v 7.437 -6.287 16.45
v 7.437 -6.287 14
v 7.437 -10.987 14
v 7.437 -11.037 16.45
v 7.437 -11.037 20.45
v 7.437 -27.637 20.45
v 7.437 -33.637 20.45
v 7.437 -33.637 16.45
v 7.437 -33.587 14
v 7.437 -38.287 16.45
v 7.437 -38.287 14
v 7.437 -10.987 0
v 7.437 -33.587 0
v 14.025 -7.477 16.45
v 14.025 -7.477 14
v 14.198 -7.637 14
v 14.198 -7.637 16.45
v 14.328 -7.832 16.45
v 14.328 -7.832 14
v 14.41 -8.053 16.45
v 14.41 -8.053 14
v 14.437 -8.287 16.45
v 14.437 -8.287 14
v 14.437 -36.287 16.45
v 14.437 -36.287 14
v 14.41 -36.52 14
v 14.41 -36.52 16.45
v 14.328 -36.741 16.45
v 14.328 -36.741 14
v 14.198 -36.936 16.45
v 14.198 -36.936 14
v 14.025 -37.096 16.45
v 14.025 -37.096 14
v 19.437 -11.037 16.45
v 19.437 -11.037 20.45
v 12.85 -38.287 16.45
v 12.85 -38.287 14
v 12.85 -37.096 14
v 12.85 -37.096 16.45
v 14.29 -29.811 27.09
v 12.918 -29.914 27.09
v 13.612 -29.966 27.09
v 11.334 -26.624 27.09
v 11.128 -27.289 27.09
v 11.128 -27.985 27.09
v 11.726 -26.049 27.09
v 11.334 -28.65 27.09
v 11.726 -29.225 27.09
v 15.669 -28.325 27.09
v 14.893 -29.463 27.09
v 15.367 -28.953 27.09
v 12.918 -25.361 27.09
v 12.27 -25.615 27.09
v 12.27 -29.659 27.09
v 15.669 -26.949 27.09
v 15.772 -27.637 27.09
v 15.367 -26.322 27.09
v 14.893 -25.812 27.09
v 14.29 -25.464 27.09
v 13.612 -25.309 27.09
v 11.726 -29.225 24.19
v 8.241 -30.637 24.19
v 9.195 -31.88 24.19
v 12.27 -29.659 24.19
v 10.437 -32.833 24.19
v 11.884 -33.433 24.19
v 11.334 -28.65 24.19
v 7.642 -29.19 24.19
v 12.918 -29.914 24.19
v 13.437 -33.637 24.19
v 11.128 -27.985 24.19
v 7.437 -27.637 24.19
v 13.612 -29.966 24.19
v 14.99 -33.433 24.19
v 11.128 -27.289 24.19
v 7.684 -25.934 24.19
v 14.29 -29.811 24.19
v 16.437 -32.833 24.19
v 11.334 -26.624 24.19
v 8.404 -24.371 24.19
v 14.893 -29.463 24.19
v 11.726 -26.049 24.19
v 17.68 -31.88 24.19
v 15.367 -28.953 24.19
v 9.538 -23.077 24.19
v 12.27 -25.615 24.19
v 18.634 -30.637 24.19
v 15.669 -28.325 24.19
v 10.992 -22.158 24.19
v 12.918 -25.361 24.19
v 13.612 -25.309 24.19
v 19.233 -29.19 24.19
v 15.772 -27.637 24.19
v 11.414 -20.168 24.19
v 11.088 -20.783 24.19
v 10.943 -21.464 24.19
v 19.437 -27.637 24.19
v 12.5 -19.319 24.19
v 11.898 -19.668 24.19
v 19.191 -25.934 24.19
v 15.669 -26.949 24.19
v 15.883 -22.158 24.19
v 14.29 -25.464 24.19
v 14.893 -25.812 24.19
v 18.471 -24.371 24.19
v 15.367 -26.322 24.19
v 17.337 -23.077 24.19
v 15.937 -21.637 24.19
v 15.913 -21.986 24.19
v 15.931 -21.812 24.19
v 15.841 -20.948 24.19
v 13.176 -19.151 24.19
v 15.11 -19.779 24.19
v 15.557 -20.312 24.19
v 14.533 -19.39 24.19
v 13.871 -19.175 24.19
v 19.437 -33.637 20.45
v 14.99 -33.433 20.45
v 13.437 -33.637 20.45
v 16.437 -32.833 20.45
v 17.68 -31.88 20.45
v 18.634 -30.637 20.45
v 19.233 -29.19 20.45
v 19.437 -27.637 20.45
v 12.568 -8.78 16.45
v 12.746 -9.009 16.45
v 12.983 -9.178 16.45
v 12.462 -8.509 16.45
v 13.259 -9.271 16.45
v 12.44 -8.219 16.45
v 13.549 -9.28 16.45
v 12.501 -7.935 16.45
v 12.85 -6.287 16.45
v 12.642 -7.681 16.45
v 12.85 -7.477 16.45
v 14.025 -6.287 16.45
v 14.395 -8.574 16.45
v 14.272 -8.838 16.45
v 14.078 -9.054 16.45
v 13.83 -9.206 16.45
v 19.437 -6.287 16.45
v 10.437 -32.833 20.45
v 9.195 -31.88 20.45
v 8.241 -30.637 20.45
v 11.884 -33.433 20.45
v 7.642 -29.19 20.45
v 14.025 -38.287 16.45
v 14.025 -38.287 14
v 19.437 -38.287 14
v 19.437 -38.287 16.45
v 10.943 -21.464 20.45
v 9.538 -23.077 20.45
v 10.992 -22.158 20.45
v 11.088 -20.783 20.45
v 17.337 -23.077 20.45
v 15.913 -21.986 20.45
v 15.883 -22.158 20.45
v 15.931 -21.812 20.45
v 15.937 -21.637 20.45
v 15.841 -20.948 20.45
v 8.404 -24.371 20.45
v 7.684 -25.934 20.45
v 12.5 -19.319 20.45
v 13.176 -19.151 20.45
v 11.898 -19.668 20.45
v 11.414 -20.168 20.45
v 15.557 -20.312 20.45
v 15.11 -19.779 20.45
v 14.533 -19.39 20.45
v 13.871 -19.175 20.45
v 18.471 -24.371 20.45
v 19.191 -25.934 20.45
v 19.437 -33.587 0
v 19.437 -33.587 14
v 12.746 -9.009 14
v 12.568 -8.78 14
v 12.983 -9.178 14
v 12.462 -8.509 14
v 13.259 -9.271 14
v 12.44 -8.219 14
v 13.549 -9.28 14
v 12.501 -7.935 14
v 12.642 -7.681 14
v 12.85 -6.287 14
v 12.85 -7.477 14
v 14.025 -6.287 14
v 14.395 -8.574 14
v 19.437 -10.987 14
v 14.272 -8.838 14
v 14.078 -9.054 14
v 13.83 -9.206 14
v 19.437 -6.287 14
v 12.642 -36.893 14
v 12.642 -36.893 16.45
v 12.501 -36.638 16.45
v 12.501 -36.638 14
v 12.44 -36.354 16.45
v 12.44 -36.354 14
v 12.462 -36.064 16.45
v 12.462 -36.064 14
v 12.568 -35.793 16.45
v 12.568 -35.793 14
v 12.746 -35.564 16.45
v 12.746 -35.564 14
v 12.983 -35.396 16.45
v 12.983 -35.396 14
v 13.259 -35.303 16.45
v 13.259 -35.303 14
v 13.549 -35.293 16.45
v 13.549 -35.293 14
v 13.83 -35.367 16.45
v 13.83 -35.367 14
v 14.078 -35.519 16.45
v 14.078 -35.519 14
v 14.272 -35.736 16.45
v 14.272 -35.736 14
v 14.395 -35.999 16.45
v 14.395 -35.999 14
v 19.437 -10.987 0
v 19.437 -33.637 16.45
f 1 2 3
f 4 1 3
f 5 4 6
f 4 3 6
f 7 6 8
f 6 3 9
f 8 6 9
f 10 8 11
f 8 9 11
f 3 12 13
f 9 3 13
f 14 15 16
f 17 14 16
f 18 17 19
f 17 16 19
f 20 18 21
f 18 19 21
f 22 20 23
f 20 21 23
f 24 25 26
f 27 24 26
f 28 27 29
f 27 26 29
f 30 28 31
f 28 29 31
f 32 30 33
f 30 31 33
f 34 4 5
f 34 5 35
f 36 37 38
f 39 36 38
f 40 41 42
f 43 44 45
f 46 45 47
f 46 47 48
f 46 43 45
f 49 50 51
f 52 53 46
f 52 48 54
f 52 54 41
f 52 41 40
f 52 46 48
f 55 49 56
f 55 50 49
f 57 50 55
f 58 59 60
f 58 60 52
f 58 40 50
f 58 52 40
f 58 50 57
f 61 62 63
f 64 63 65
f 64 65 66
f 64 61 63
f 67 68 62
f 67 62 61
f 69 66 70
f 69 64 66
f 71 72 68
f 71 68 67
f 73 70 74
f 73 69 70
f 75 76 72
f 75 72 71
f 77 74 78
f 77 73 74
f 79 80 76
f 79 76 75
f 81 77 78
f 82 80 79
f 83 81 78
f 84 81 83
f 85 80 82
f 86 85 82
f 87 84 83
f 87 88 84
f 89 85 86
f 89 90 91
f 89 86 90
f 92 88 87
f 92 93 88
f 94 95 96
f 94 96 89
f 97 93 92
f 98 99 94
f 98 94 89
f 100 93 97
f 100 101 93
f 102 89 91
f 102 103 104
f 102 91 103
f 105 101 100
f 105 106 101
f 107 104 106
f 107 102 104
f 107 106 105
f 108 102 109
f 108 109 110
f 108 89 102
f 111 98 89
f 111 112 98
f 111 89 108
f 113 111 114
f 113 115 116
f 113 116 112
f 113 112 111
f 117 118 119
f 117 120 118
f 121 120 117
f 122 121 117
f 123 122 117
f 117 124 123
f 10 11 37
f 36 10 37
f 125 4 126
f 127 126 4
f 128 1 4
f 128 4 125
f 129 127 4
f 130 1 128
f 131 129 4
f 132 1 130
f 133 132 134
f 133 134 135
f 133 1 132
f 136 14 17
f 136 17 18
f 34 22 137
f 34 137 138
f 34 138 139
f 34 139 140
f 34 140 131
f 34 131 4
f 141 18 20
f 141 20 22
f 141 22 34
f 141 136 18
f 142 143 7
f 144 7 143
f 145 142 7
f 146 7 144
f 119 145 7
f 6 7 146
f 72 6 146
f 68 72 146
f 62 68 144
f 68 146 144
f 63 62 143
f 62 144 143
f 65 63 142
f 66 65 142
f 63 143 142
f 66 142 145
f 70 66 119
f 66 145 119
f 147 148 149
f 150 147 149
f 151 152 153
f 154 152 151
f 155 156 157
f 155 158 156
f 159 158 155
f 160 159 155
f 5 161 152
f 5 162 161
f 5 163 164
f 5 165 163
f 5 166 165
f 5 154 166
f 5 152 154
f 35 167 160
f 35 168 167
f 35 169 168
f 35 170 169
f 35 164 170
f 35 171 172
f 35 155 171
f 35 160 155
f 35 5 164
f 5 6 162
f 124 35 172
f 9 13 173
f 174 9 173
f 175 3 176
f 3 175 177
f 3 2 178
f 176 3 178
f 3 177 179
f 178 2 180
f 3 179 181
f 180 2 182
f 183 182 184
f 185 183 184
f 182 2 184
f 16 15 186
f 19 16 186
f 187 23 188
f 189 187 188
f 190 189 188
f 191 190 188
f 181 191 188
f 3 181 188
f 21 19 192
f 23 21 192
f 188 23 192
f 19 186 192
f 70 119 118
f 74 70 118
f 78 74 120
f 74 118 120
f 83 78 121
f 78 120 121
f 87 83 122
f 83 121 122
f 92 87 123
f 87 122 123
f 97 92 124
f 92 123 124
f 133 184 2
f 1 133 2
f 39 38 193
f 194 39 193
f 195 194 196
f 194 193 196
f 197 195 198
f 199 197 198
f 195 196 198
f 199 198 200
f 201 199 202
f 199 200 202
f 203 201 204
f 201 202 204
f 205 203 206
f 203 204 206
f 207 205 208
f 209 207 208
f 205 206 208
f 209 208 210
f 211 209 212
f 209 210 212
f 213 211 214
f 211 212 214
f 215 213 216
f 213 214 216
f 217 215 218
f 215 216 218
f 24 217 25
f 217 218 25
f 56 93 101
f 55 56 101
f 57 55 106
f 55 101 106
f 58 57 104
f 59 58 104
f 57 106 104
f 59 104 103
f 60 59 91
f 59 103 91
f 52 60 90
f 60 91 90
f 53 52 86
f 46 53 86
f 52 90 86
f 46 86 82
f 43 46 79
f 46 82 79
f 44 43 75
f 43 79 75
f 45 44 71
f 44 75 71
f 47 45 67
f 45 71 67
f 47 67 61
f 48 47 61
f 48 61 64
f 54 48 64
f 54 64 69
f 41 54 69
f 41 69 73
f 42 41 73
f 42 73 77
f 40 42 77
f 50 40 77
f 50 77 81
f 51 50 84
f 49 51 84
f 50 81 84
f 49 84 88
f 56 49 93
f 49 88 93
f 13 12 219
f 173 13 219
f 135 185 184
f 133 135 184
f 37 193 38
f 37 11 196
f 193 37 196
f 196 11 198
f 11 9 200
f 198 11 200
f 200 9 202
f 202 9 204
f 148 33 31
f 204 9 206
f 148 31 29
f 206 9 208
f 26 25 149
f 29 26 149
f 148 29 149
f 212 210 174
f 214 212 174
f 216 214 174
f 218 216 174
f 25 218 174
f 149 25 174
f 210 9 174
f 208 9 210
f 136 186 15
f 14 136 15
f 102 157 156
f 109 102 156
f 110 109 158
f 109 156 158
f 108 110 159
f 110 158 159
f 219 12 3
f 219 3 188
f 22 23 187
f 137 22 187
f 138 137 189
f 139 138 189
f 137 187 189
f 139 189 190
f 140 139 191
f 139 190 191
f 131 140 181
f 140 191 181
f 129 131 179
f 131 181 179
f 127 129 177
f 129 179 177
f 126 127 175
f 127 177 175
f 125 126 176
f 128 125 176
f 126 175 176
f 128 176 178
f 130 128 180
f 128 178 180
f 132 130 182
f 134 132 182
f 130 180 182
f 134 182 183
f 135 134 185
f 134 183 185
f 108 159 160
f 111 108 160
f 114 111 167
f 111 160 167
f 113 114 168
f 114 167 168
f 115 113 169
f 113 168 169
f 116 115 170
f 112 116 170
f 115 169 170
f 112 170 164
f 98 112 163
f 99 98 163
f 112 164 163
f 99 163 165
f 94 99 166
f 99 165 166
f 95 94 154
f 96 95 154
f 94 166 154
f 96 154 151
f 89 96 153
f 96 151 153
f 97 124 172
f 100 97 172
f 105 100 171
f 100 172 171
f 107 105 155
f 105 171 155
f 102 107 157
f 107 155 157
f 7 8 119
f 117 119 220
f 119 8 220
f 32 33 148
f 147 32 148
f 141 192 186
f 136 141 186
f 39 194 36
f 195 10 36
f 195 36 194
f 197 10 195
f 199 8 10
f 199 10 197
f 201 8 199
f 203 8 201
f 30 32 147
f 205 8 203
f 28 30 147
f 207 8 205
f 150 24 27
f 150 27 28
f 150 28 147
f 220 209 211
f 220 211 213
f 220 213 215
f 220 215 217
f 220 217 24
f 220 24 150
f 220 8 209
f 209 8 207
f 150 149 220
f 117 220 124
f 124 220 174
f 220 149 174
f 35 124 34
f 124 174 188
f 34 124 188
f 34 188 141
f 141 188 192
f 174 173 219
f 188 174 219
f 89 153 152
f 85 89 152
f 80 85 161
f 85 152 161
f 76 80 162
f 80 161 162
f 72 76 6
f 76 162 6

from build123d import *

# Parameters (mm, degrees)
F0_W     = 12
F0_H     = 22.6
F1_DEPTH = 14
F2_W     = 12
F2_H     = 22.6
F3_DEPTH = 2.45
F4_W     = 12
F4_H     = 22.6
F5_DEPTH = 4
F7_DEPTH = 3.74
F8_R     = 2.335
F9_DEPTH = 2.9


# Not quite as in the source:
# - a feature names something its author has since deleted; it is built from what else it names


with BuildPart() as f1:
    # F0 (on Top) → F1 (new body)
    with BuildSketch(Plane.XY):
        with Locations((13.4373875856, -22.2866622627)):
            Rectangle(F0_W, F0_H)
    extrude(amount=F1_DEPTH)

    # F2 (on face) → F3 (join)
    with BuildSketch(Plane.XY.offset(14)):
        with BuildLine():
            Line((7.4373875856, -10.9866622627), (19.4373875856, -10.9866622627))
            Line((19.4373875856, -10.9866622627), (19.4373875856, -6.2866622627))
            Line((19.4373875856, -6.2866622627), (14.0248552029, -6.2866622627))
            Line((14.0248552029, -6.2866622627), (14.0248552029, -7.4774145882))
            ThreePointArc((14.0248552029, -7.4774145882), (14.3283049828, -7.8324968838), (14.4373875856, -8.2866622627))
            ThreePointArc((14.4373875856, -8.2866622627), (12.9832222068, -9.1775796599), (12.8499199684, -7.4774145882))
            Line((12.8499199684, -7.4774145882), (12.8499199684, -6.2866622627))
            Line((12.8499199684, -6.2866622627), (7.4373875856, -6.2866622627))
            Line((7.4373875856, -6.2866622627), (7.4373875856, -10.9866622627))
        make_face()
        with BuildLine():
            Line((19.4373875856, -38.2866622627), (19.4373875856, -33.5866622627))
            Line((19.4373875856, -33.5866622627), (7.4373875856, -33.5866622627))
            Line((7.4373875856, -33.5866622627), (7.4373875856, -38.2866622627))
            Line((7.4373875856, -38.2866622627), (12.8499199684, -38.2866622627))
            Line((12.8499199684, -38.2866622627), (12.8499199684, -37.0959099372))
            ThreePointArc((12.8499199684, -37.0959099372), (12.9832222068, -35.3957448655), (14.4373875856, -36.2866622627))
            ThreePointArc((14.4373875856, -36.2866622627), (14.3283049828, -36.7408276416), (14.0248552029, -37.0959099372))
            Line((14.0248552029, -37.0959099372), (14.0248552029, -38.2866622627))
            Line((14.0248552029, -38.2866622627), (19.4373875856, -38.2866622627))
        make_face()
        with Locations((13.4373875856, -22.2866622627)):
            Rectangle(F2_W, F2_H)
    extrude(amount=F3_DEPTH)

    # F4 (on face) → F5 (join)
    with BuildSketch(Plane.XY.offset(16.45)):
        with Locations((13.4373875856, -22.3371585727)):
            Rectangle(F4_W, F4_H)
    extrude(amount=F5_DEPTH)

    # F6 (on face) → F7 (join)
    with BuildSketch(Plane.XY.offset(20.45)):
        with BuildLine():
            ThreePointArc((13.4373875856, -33.6371585727), (17.6800282728, -31.8797992598), (19.4373875856, -27.6371585727))
            ThreePointArc((19.4373875856, -27.6371585727), (18.4708192303, -24.371493881), (15.8825322928, -22.157991906))
            ThreePointArc((15.8825322928, -22.157991906), (13.4373875856, -24.1371585727), (10.9922428785, -22.157991906))
            ThreePointArc((10.9922428785, -22.157991906), (8.403955941, -24.371493881), (7.4373875856, -27.6371585727))
            ThreePointArc((7.4373875856, -27.6371585727), (9.1947468985, -31.8797992598), (13.4373875856, -33.6371585727))
        make_face()
        with BuildLine():
            ThreePointArc((10.9922428785, -22.157991906), (13.4373875856, -24.1371585727), (15.8825322928, -22.157991906))
            ThreePointArc((15.8825322928, -22.157991906), (13.4373875856, -21.6371585727), (10.9922428785, -22.157991906))
        make_face()
        with BuildLine():
            ThreePointArc((10.9922428785, -22.157991906), (13.4373875856, -21.6371585727), (15.8825322928, -22.157991906))
            ThreePointArc((15.8825322928, -22.157991906), (15.9236359409, -21.8990156254), (15.9373875856, -21.6371585727))
            ThreePointArc((15.9373875856, -21.6371585727), (13.1755305329, -19.1509102174), (10.9922428785, -22.157991906))
        make_face()
    extrude(amount=F7_DEPTH)

    # F8 (on face) → F9 (join)
    with BuildSketch(Plane.XY.offset(24.19)):
        with Locations((13.4373875856, -27.6371585727)):
            Circle(F8_R)
    extrude(amount=F9_DEPTH)


solid = f1.part
